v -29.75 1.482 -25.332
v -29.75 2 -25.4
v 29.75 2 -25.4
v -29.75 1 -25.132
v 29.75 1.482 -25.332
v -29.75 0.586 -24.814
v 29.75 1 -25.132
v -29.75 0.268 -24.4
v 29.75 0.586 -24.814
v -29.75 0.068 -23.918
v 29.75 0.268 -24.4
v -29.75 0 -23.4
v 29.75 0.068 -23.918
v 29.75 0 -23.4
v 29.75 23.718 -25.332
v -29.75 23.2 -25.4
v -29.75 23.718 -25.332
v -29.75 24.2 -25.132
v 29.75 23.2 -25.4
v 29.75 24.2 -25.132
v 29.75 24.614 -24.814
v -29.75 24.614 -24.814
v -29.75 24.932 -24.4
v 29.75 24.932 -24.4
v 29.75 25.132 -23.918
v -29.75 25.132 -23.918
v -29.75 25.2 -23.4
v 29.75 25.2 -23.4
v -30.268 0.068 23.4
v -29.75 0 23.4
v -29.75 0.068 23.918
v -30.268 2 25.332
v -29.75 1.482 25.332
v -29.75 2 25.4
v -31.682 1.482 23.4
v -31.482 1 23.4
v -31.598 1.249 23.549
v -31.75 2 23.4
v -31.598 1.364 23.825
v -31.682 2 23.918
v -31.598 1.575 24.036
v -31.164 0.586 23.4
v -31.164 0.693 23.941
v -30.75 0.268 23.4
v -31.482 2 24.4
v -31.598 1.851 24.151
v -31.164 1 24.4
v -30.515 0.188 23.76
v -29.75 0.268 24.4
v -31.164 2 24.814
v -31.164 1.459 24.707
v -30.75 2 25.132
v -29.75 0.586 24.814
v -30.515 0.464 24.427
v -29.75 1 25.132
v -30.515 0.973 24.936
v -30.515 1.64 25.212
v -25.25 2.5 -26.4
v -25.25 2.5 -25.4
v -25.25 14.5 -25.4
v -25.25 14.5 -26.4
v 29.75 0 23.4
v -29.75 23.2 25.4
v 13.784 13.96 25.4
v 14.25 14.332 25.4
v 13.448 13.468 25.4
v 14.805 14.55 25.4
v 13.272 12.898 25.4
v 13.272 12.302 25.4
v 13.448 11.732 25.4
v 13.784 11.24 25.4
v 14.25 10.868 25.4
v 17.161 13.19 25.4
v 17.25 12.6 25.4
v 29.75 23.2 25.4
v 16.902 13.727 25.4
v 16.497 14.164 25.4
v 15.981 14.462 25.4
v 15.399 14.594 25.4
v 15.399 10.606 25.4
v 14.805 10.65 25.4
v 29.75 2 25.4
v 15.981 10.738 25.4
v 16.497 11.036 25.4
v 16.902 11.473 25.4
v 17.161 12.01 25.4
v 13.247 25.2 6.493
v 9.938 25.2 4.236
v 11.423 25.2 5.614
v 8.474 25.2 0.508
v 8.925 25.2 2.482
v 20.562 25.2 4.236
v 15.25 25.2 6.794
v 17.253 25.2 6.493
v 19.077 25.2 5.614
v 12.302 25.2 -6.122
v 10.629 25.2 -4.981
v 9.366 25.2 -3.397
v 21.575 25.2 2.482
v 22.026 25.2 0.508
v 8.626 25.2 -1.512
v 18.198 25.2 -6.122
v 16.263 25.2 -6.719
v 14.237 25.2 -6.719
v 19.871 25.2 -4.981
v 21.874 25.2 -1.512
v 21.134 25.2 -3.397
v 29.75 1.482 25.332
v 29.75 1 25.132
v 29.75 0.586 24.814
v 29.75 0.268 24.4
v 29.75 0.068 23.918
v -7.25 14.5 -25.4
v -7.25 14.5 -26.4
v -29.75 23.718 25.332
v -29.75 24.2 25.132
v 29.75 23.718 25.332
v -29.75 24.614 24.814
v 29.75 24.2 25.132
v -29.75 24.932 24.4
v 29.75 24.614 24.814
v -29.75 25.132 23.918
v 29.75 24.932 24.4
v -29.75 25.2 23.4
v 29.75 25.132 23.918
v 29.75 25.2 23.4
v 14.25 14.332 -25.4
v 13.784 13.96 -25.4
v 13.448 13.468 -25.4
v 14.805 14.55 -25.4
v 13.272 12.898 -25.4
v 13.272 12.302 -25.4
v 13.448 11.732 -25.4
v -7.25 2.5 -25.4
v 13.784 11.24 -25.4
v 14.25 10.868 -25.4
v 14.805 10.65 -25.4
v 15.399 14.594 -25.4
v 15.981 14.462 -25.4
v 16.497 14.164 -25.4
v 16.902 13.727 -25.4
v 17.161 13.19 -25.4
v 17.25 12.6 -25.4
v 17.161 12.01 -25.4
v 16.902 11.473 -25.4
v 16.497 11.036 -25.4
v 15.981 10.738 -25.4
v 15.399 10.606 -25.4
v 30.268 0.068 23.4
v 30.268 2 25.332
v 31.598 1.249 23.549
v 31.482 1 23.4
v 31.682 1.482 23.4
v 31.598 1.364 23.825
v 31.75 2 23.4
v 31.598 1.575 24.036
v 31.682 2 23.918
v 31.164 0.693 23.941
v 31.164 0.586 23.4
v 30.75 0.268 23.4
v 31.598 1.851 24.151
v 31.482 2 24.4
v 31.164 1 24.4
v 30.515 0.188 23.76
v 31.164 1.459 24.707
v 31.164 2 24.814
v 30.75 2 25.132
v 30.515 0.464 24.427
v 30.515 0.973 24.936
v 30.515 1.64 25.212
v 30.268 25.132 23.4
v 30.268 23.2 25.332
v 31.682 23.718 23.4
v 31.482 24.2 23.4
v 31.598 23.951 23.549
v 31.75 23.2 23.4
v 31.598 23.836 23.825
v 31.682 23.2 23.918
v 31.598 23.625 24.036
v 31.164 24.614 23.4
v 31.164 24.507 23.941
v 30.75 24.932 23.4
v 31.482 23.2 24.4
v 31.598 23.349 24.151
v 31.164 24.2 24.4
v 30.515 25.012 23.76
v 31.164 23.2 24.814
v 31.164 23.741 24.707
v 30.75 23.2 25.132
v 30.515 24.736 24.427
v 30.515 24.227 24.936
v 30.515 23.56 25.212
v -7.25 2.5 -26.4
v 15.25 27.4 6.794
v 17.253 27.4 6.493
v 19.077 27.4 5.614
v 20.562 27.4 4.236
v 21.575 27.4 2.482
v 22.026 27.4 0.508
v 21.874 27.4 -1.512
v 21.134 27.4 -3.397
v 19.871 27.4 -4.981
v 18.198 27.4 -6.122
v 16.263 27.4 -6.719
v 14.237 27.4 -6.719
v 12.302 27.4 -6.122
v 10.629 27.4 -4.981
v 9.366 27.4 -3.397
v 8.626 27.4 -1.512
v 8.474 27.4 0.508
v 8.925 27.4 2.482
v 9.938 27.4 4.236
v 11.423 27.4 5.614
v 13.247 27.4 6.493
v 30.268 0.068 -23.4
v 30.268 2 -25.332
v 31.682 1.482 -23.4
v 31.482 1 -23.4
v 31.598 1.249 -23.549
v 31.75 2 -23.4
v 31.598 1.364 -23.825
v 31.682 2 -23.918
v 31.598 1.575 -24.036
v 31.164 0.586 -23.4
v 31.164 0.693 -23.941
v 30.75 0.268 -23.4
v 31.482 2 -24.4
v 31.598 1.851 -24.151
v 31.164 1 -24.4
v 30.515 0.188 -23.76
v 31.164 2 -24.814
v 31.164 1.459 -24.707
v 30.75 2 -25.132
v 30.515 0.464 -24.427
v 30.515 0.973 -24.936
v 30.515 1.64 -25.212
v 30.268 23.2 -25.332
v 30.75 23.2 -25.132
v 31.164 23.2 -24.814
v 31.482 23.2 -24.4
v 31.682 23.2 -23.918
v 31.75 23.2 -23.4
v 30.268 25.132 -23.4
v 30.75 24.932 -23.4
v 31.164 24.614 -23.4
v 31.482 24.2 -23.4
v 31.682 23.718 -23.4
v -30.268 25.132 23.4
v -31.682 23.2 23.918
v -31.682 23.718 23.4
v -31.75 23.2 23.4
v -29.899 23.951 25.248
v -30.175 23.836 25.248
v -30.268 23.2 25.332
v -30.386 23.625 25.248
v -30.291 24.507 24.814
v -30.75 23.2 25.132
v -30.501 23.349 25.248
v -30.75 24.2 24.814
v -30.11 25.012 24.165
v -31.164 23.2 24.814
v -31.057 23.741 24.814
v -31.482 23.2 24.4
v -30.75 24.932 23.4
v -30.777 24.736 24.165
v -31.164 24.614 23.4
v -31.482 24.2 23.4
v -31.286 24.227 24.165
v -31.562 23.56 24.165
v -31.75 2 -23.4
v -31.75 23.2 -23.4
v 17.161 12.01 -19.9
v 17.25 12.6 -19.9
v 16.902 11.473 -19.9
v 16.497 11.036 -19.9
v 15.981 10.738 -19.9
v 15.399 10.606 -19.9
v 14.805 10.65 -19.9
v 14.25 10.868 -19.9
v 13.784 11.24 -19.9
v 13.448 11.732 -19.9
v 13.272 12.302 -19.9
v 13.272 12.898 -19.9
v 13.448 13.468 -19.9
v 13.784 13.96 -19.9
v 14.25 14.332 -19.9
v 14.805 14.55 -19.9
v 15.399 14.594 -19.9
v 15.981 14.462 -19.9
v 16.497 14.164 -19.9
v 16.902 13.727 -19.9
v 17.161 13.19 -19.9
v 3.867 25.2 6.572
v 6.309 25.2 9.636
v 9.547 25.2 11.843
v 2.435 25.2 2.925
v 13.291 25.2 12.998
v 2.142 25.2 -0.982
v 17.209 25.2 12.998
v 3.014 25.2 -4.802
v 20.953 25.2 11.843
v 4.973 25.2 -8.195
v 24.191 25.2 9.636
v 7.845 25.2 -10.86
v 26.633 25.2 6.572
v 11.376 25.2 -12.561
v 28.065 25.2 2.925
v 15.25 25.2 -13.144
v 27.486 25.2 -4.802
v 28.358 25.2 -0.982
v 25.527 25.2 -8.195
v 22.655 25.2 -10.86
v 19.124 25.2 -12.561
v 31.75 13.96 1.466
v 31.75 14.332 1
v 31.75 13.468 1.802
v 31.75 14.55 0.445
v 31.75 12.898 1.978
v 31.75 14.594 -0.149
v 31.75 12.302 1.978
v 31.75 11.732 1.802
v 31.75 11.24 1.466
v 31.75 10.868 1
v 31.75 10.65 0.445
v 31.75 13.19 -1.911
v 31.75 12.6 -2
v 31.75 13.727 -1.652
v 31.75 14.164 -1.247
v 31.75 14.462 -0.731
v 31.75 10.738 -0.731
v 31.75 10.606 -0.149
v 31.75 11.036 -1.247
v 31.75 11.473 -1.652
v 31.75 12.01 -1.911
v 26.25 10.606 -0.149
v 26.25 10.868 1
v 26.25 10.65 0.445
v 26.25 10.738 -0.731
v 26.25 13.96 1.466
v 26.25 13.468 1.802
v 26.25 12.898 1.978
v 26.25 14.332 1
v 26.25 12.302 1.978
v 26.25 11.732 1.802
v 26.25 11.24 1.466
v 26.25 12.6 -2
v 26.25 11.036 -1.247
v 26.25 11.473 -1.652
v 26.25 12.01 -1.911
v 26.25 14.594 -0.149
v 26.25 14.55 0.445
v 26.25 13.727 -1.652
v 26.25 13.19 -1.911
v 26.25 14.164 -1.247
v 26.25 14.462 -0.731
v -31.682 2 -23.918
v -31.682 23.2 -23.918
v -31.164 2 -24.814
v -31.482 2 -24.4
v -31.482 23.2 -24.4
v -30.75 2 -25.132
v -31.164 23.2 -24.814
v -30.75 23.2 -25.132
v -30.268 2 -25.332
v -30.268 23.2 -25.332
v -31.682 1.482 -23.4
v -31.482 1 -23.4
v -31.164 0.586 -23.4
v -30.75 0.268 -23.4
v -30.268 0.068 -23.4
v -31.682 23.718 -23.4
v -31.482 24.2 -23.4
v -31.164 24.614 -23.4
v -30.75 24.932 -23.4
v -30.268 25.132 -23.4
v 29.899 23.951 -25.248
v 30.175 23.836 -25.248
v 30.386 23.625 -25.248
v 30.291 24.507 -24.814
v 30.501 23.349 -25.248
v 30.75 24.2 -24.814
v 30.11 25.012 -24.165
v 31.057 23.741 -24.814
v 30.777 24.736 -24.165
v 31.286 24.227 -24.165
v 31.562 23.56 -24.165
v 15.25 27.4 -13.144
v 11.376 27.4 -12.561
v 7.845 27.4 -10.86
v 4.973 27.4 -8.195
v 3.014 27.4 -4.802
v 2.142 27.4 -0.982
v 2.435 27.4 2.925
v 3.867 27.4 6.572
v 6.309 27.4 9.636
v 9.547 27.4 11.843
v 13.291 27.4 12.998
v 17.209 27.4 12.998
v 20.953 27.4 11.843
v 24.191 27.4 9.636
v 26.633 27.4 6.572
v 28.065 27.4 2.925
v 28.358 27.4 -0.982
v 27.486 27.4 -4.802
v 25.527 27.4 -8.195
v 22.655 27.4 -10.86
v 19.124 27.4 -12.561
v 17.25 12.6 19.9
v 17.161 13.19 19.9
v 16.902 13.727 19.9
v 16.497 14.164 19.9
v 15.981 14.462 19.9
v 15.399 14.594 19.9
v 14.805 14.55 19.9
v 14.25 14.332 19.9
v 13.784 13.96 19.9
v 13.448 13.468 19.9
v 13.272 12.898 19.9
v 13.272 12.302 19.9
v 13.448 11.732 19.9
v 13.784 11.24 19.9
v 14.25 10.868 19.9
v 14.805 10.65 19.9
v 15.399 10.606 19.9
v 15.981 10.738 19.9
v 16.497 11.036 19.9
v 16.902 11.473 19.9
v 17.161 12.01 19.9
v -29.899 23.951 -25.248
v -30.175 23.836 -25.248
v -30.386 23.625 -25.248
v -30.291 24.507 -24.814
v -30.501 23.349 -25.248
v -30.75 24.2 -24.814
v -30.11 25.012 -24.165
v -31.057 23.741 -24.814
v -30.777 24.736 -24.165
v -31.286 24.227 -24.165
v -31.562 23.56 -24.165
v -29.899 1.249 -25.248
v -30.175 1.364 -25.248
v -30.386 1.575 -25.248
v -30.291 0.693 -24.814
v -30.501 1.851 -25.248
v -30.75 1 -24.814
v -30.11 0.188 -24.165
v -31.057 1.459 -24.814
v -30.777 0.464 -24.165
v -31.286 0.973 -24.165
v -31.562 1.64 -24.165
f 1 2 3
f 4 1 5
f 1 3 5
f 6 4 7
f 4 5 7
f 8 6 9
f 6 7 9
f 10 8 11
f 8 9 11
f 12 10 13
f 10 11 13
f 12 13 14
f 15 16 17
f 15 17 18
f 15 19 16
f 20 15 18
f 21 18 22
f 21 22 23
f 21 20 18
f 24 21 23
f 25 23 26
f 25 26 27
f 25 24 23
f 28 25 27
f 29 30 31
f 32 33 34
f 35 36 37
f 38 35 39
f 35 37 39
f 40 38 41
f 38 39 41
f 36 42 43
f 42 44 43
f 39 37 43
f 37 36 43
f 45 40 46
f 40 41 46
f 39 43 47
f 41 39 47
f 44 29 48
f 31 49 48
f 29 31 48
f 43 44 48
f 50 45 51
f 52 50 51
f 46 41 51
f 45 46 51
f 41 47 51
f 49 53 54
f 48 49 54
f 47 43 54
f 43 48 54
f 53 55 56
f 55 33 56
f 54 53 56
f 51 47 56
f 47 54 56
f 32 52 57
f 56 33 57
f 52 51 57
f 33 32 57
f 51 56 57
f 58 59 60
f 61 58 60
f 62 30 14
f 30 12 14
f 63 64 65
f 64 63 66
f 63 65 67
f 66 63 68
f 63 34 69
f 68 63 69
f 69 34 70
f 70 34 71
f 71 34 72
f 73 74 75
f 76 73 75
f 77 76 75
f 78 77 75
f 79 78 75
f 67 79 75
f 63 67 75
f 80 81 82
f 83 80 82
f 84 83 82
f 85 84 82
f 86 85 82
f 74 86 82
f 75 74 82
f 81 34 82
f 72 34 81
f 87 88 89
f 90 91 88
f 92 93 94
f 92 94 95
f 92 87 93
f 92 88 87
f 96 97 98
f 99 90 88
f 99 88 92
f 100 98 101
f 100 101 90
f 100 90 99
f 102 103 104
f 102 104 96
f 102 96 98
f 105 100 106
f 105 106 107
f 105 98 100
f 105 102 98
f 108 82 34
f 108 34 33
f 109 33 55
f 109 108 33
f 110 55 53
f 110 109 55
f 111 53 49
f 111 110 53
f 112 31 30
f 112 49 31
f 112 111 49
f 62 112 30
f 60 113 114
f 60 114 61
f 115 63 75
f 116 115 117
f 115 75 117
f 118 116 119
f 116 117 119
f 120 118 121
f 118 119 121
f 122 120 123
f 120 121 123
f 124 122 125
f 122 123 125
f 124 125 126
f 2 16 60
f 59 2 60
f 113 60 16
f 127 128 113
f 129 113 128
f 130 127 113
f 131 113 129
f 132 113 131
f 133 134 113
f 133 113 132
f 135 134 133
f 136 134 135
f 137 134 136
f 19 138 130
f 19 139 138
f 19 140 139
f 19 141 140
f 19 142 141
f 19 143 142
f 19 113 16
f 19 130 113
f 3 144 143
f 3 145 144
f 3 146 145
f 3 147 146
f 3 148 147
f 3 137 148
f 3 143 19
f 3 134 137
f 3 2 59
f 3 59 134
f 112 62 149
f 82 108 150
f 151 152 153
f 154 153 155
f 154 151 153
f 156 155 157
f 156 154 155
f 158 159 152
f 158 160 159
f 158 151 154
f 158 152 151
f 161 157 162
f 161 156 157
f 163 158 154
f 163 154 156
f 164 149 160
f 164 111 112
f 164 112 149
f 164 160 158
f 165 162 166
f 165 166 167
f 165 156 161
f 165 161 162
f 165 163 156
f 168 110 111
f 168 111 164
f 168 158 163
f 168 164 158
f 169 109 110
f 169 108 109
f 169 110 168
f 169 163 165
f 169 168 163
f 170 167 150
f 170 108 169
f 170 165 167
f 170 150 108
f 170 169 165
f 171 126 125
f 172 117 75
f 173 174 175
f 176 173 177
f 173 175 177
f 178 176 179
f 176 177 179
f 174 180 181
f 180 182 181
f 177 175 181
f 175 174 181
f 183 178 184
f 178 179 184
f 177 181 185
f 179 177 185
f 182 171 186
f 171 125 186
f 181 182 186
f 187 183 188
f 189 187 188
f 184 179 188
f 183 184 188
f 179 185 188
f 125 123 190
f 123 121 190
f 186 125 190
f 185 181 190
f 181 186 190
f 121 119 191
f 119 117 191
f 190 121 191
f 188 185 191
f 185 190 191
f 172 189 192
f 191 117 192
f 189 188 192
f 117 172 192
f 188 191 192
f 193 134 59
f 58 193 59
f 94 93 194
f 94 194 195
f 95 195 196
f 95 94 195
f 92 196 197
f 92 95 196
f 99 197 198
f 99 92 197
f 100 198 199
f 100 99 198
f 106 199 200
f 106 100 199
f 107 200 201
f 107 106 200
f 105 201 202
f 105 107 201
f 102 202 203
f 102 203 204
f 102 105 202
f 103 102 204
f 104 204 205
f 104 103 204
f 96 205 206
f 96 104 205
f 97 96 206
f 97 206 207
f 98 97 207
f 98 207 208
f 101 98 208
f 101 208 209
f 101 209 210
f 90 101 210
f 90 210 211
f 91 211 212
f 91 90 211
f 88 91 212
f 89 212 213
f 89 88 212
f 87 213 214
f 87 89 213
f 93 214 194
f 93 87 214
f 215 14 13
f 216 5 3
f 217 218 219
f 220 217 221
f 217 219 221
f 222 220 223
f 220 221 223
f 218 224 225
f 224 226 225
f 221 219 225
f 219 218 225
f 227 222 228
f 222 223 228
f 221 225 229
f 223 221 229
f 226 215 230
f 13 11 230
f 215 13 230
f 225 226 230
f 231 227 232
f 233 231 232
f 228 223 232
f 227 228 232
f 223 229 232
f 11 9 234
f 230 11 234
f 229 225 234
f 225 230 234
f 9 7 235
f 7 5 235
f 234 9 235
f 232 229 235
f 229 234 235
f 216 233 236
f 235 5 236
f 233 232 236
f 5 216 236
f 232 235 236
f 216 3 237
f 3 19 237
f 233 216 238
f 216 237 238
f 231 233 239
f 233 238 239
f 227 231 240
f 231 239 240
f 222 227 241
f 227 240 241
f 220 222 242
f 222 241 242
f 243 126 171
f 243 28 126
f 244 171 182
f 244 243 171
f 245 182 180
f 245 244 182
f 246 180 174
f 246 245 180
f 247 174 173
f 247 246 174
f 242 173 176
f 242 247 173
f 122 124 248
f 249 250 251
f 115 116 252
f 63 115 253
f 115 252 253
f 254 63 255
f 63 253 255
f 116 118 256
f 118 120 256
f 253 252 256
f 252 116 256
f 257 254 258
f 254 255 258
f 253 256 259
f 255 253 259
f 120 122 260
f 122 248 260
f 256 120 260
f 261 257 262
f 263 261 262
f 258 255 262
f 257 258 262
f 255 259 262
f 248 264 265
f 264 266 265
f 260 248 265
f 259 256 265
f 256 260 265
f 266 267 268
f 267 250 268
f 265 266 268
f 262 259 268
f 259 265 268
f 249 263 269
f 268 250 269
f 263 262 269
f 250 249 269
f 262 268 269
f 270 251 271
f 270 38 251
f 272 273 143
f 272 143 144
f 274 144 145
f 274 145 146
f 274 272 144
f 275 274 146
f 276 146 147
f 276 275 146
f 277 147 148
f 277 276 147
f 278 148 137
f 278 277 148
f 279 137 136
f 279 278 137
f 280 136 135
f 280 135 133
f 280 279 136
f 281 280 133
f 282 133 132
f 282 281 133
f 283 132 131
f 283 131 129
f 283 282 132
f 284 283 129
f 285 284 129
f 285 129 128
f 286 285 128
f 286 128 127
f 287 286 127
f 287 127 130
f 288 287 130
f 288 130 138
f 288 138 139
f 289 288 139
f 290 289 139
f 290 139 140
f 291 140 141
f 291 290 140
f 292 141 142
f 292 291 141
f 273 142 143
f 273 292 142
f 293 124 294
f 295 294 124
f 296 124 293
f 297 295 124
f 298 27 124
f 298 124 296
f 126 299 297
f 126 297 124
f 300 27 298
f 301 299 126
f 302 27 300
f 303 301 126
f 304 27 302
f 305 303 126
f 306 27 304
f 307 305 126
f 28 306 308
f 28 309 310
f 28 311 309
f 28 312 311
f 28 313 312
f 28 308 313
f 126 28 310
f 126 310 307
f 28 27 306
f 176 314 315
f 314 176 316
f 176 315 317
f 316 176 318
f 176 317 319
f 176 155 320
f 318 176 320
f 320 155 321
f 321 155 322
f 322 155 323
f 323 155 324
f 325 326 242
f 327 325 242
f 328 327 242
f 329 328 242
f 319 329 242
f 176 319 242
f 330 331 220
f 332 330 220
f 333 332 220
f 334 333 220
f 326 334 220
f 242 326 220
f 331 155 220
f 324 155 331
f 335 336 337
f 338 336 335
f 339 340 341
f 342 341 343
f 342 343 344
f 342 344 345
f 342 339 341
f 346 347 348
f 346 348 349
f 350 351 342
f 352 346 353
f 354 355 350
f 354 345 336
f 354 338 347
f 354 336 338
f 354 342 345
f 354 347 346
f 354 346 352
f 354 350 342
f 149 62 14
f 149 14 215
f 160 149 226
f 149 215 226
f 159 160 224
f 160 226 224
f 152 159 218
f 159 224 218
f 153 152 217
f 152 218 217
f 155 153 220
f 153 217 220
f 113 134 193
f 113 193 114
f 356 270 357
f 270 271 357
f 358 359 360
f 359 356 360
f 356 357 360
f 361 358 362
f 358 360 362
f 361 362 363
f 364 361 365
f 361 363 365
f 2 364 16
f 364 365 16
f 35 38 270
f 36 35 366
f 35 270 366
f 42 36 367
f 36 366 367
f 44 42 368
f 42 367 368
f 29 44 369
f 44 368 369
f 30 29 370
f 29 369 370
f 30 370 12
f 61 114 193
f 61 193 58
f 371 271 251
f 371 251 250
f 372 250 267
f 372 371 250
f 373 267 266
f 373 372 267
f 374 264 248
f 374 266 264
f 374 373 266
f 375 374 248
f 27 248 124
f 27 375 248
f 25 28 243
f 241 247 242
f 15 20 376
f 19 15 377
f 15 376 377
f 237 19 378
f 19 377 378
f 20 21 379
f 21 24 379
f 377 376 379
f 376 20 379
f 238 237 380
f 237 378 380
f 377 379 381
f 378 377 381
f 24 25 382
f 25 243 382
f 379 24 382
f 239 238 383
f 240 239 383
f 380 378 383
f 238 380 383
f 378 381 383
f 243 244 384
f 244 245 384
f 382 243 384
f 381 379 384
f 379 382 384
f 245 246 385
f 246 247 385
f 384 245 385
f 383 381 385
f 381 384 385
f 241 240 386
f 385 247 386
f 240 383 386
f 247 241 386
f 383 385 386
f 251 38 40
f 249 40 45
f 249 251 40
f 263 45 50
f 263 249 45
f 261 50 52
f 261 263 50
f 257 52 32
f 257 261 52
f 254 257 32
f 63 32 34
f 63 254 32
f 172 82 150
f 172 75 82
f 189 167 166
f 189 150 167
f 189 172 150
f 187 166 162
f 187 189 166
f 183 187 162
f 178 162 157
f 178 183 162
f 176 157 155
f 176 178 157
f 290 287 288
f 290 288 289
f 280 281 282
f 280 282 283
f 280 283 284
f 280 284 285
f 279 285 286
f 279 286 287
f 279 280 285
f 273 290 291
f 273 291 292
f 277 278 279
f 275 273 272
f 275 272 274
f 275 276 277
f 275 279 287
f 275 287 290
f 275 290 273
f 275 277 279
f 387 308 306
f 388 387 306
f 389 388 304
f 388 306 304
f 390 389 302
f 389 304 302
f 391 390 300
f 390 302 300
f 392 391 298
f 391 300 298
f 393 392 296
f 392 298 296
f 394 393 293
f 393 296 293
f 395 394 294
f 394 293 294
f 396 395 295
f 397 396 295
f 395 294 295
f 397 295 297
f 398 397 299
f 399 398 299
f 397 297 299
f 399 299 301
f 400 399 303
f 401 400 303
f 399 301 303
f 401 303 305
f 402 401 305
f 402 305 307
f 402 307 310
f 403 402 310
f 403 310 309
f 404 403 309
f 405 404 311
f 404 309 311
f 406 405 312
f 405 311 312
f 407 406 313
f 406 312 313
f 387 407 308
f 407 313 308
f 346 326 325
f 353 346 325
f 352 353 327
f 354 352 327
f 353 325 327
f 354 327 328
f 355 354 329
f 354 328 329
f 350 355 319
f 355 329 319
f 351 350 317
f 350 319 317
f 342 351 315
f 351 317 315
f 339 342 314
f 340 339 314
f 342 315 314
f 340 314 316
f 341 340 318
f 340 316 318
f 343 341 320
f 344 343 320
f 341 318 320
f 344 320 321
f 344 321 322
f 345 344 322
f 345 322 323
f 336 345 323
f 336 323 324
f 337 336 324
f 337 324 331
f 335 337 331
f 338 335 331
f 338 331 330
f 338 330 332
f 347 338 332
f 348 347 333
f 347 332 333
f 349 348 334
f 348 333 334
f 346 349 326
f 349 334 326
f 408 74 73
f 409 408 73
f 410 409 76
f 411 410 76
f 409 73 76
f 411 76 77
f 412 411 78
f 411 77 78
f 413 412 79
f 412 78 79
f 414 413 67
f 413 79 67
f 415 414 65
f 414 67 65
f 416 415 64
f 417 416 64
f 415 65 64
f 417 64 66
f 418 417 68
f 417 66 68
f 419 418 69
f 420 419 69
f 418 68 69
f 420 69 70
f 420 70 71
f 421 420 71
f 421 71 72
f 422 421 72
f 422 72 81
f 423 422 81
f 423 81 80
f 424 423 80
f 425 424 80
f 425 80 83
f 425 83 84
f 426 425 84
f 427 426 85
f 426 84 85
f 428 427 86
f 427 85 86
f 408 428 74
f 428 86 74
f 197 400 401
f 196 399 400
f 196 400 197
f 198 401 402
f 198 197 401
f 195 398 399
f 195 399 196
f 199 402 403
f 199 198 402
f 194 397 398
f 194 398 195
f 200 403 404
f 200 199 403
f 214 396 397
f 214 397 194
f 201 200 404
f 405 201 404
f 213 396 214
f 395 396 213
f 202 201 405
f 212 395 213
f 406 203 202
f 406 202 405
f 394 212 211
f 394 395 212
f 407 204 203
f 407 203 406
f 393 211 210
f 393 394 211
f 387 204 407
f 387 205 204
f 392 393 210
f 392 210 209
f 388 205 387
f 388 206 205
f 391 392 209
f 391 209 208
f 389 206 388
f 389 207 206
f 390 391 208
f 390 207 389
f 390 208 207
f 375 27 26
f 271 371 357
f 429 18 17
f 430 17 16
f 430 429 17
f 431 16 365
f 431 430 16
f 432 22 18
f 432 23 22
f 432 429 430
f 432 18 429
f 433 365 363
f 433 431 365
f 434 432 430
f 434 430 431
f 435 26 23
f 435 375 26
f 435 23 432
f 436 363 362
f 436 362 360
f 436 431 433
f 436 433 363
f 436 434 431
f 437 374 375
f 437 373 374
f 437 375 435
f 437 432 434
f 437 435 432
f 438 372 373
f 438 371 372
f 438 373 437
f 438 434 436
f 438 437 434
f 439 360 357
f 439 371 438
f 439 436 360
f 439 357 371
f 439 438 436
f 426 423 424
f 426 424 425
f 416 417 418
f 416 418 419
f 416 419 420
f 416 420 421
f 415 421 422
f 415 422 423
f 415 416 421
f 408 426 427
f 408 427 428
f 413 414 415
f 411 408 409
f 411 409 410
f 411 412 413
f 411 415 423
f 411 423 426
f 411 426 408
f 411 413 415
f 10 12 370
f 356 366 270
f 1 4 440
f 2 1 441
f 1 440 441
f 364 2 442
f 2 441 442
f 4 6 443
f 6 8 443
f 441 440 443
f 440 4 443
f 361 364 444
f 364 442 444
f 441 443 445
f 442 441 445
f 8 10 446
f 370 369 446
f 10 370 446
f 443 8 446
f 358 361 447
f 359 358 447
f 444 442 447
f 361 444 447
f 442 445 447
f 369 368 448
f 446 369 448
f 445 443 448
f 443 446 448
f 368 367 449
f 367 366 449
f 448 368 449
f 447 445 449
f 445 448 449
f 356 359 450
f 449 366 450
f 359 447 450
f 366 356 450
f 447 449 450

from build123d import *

# Parameters (mm, degrees)
SKETCH1_W           = 63.5
SKETCH1_H           = 50.8
BOSS_EXTRUDE1_DEPTH = 25.2
SKETCH2_R           = 13.1445
SKETCH2_R_2         = 6.7945
BOSS_EXTRUDE2_DEPTH = 2.2
SKETCH3_R           = 2
CUT_EXTRUDE1_DEPTH  = 5.5
SKETCH4_R           = 2
CUT_EXTRUDE2_DEPTH  = 5.5
CUT_EXTRUDE3_START  = -5.5
SKETCH5_R           = 2
CUT_EXTRUDE3_DEPTH  = 5.5
FILLET1_R           = 2
SKETCH6_W           = 18
SKETCH6_H           = 12
BOSS_EXTRUDE3_DEPTH = 1


with BuildPart() as part:
    # Sketch1 → Boss-Extrude1 (new body)
    with BuildSketch(Plane(origin=(0, 0, 0), x_dir=(1, 0, 0), z_dir=(0, 1, 0))):
        Rectangle(SKETCH1_W, SKETCH1_H)
    extrude(amount=BOSS_EXTRUDE1_DEPTH)

    # Sketch2 → Boss-Extrude2 (add)
    with BuildSketch(Plane(origin=(0, 25.2, 0), x_dir=(1, 0, 0), z_dir=(0, 1, 0))):
        with Locations(Location((15.25, 0, 0), (0, 0, 90))):
            Circle(SKETCH2_R)
        with Locations(Location((15.25, 0, 0), (0, 0, 270))):
            Circle(SKETCH2_R_2, mode=Mode.SUBTRACT)
    extrude(amount=BOSS_EXTRUDE2_DEPTH)

    # Sketch3 → Cut-Extrude1 (cut)
    with BuildSketch(Plane.XY.offset(25.4)):
        with Locations((15.25, 12.6)):
            Circle(SKETCH3_R)
    extrude(amount=-CUT_EXTRUDE1_DEPTH, mode=Mode.SUBTRACT)

    # Sketch4 → Cut-Extrude2 (cut)
    with BuildSketch(Plane(origin=(31.75, 0, 0), x_dir=(0, 0, -1), z_dir=(1, 0, 0))):
        with Locations((0, 12.6)):
            Circle(SKETCH4_R)
    extrude(amount=-CUT_EXTRUDE2_DEPTH, mode=Mode.SUBTRACT)

    # Sketch5 → Cut-Extrude3 (cut)
    with BuildSketch(Plane(origin=(0, 0, -25.4), x_dir=(-1, 0, 0), z_dir=(0, 0, -1)).offset(CUT_EXTRUDE3_START)):
        with Locations(Location((-15.25, 12.6, 0), (0, 0, 180))):
            Circle(SKETCH5_R)
    extrude(amount=CUT_EXTRUDE3_DEPTH, mode=Mode.SUBTRACT)

    # Fillet1
    fillet1_edges = [part.edges().sort_by_distance(p)[0] for p in [
        (-31.75, 25.2, 0),
        (0, 25.2, 25.4),
        (31.75, 25.2, 0),
        (0, 0, 25.4),
        (-31.75, 0, 0),
        (0, 0, -25.4),
        (31.75, 0, 0),
        (0, 25.2, -25.4),
        (31.75, 12.6, 25.4),
        (-31.75, 12.6, 25.4),
        (-31.75, 12.6, -25.4),
        (31.75, 12.6, -25.4),
    ]]
    fillet(fillet1_edges, radius=FILLET1_R)

    # Sketch6 → Boss-Extrude3 (add)
    with BuildSketch(Plane(origin=(0, 0, -25.4), x_dir=(-1, 0, 0), z_dir=(0, 0, -1))):
        with Locations((16.25, 8.5)):
            Rectangle(SKETCH6_W, SKETCH6_H)
    extrude(amount=BOSS_EXTRUDE3_DEPTH)


solid = part.part
